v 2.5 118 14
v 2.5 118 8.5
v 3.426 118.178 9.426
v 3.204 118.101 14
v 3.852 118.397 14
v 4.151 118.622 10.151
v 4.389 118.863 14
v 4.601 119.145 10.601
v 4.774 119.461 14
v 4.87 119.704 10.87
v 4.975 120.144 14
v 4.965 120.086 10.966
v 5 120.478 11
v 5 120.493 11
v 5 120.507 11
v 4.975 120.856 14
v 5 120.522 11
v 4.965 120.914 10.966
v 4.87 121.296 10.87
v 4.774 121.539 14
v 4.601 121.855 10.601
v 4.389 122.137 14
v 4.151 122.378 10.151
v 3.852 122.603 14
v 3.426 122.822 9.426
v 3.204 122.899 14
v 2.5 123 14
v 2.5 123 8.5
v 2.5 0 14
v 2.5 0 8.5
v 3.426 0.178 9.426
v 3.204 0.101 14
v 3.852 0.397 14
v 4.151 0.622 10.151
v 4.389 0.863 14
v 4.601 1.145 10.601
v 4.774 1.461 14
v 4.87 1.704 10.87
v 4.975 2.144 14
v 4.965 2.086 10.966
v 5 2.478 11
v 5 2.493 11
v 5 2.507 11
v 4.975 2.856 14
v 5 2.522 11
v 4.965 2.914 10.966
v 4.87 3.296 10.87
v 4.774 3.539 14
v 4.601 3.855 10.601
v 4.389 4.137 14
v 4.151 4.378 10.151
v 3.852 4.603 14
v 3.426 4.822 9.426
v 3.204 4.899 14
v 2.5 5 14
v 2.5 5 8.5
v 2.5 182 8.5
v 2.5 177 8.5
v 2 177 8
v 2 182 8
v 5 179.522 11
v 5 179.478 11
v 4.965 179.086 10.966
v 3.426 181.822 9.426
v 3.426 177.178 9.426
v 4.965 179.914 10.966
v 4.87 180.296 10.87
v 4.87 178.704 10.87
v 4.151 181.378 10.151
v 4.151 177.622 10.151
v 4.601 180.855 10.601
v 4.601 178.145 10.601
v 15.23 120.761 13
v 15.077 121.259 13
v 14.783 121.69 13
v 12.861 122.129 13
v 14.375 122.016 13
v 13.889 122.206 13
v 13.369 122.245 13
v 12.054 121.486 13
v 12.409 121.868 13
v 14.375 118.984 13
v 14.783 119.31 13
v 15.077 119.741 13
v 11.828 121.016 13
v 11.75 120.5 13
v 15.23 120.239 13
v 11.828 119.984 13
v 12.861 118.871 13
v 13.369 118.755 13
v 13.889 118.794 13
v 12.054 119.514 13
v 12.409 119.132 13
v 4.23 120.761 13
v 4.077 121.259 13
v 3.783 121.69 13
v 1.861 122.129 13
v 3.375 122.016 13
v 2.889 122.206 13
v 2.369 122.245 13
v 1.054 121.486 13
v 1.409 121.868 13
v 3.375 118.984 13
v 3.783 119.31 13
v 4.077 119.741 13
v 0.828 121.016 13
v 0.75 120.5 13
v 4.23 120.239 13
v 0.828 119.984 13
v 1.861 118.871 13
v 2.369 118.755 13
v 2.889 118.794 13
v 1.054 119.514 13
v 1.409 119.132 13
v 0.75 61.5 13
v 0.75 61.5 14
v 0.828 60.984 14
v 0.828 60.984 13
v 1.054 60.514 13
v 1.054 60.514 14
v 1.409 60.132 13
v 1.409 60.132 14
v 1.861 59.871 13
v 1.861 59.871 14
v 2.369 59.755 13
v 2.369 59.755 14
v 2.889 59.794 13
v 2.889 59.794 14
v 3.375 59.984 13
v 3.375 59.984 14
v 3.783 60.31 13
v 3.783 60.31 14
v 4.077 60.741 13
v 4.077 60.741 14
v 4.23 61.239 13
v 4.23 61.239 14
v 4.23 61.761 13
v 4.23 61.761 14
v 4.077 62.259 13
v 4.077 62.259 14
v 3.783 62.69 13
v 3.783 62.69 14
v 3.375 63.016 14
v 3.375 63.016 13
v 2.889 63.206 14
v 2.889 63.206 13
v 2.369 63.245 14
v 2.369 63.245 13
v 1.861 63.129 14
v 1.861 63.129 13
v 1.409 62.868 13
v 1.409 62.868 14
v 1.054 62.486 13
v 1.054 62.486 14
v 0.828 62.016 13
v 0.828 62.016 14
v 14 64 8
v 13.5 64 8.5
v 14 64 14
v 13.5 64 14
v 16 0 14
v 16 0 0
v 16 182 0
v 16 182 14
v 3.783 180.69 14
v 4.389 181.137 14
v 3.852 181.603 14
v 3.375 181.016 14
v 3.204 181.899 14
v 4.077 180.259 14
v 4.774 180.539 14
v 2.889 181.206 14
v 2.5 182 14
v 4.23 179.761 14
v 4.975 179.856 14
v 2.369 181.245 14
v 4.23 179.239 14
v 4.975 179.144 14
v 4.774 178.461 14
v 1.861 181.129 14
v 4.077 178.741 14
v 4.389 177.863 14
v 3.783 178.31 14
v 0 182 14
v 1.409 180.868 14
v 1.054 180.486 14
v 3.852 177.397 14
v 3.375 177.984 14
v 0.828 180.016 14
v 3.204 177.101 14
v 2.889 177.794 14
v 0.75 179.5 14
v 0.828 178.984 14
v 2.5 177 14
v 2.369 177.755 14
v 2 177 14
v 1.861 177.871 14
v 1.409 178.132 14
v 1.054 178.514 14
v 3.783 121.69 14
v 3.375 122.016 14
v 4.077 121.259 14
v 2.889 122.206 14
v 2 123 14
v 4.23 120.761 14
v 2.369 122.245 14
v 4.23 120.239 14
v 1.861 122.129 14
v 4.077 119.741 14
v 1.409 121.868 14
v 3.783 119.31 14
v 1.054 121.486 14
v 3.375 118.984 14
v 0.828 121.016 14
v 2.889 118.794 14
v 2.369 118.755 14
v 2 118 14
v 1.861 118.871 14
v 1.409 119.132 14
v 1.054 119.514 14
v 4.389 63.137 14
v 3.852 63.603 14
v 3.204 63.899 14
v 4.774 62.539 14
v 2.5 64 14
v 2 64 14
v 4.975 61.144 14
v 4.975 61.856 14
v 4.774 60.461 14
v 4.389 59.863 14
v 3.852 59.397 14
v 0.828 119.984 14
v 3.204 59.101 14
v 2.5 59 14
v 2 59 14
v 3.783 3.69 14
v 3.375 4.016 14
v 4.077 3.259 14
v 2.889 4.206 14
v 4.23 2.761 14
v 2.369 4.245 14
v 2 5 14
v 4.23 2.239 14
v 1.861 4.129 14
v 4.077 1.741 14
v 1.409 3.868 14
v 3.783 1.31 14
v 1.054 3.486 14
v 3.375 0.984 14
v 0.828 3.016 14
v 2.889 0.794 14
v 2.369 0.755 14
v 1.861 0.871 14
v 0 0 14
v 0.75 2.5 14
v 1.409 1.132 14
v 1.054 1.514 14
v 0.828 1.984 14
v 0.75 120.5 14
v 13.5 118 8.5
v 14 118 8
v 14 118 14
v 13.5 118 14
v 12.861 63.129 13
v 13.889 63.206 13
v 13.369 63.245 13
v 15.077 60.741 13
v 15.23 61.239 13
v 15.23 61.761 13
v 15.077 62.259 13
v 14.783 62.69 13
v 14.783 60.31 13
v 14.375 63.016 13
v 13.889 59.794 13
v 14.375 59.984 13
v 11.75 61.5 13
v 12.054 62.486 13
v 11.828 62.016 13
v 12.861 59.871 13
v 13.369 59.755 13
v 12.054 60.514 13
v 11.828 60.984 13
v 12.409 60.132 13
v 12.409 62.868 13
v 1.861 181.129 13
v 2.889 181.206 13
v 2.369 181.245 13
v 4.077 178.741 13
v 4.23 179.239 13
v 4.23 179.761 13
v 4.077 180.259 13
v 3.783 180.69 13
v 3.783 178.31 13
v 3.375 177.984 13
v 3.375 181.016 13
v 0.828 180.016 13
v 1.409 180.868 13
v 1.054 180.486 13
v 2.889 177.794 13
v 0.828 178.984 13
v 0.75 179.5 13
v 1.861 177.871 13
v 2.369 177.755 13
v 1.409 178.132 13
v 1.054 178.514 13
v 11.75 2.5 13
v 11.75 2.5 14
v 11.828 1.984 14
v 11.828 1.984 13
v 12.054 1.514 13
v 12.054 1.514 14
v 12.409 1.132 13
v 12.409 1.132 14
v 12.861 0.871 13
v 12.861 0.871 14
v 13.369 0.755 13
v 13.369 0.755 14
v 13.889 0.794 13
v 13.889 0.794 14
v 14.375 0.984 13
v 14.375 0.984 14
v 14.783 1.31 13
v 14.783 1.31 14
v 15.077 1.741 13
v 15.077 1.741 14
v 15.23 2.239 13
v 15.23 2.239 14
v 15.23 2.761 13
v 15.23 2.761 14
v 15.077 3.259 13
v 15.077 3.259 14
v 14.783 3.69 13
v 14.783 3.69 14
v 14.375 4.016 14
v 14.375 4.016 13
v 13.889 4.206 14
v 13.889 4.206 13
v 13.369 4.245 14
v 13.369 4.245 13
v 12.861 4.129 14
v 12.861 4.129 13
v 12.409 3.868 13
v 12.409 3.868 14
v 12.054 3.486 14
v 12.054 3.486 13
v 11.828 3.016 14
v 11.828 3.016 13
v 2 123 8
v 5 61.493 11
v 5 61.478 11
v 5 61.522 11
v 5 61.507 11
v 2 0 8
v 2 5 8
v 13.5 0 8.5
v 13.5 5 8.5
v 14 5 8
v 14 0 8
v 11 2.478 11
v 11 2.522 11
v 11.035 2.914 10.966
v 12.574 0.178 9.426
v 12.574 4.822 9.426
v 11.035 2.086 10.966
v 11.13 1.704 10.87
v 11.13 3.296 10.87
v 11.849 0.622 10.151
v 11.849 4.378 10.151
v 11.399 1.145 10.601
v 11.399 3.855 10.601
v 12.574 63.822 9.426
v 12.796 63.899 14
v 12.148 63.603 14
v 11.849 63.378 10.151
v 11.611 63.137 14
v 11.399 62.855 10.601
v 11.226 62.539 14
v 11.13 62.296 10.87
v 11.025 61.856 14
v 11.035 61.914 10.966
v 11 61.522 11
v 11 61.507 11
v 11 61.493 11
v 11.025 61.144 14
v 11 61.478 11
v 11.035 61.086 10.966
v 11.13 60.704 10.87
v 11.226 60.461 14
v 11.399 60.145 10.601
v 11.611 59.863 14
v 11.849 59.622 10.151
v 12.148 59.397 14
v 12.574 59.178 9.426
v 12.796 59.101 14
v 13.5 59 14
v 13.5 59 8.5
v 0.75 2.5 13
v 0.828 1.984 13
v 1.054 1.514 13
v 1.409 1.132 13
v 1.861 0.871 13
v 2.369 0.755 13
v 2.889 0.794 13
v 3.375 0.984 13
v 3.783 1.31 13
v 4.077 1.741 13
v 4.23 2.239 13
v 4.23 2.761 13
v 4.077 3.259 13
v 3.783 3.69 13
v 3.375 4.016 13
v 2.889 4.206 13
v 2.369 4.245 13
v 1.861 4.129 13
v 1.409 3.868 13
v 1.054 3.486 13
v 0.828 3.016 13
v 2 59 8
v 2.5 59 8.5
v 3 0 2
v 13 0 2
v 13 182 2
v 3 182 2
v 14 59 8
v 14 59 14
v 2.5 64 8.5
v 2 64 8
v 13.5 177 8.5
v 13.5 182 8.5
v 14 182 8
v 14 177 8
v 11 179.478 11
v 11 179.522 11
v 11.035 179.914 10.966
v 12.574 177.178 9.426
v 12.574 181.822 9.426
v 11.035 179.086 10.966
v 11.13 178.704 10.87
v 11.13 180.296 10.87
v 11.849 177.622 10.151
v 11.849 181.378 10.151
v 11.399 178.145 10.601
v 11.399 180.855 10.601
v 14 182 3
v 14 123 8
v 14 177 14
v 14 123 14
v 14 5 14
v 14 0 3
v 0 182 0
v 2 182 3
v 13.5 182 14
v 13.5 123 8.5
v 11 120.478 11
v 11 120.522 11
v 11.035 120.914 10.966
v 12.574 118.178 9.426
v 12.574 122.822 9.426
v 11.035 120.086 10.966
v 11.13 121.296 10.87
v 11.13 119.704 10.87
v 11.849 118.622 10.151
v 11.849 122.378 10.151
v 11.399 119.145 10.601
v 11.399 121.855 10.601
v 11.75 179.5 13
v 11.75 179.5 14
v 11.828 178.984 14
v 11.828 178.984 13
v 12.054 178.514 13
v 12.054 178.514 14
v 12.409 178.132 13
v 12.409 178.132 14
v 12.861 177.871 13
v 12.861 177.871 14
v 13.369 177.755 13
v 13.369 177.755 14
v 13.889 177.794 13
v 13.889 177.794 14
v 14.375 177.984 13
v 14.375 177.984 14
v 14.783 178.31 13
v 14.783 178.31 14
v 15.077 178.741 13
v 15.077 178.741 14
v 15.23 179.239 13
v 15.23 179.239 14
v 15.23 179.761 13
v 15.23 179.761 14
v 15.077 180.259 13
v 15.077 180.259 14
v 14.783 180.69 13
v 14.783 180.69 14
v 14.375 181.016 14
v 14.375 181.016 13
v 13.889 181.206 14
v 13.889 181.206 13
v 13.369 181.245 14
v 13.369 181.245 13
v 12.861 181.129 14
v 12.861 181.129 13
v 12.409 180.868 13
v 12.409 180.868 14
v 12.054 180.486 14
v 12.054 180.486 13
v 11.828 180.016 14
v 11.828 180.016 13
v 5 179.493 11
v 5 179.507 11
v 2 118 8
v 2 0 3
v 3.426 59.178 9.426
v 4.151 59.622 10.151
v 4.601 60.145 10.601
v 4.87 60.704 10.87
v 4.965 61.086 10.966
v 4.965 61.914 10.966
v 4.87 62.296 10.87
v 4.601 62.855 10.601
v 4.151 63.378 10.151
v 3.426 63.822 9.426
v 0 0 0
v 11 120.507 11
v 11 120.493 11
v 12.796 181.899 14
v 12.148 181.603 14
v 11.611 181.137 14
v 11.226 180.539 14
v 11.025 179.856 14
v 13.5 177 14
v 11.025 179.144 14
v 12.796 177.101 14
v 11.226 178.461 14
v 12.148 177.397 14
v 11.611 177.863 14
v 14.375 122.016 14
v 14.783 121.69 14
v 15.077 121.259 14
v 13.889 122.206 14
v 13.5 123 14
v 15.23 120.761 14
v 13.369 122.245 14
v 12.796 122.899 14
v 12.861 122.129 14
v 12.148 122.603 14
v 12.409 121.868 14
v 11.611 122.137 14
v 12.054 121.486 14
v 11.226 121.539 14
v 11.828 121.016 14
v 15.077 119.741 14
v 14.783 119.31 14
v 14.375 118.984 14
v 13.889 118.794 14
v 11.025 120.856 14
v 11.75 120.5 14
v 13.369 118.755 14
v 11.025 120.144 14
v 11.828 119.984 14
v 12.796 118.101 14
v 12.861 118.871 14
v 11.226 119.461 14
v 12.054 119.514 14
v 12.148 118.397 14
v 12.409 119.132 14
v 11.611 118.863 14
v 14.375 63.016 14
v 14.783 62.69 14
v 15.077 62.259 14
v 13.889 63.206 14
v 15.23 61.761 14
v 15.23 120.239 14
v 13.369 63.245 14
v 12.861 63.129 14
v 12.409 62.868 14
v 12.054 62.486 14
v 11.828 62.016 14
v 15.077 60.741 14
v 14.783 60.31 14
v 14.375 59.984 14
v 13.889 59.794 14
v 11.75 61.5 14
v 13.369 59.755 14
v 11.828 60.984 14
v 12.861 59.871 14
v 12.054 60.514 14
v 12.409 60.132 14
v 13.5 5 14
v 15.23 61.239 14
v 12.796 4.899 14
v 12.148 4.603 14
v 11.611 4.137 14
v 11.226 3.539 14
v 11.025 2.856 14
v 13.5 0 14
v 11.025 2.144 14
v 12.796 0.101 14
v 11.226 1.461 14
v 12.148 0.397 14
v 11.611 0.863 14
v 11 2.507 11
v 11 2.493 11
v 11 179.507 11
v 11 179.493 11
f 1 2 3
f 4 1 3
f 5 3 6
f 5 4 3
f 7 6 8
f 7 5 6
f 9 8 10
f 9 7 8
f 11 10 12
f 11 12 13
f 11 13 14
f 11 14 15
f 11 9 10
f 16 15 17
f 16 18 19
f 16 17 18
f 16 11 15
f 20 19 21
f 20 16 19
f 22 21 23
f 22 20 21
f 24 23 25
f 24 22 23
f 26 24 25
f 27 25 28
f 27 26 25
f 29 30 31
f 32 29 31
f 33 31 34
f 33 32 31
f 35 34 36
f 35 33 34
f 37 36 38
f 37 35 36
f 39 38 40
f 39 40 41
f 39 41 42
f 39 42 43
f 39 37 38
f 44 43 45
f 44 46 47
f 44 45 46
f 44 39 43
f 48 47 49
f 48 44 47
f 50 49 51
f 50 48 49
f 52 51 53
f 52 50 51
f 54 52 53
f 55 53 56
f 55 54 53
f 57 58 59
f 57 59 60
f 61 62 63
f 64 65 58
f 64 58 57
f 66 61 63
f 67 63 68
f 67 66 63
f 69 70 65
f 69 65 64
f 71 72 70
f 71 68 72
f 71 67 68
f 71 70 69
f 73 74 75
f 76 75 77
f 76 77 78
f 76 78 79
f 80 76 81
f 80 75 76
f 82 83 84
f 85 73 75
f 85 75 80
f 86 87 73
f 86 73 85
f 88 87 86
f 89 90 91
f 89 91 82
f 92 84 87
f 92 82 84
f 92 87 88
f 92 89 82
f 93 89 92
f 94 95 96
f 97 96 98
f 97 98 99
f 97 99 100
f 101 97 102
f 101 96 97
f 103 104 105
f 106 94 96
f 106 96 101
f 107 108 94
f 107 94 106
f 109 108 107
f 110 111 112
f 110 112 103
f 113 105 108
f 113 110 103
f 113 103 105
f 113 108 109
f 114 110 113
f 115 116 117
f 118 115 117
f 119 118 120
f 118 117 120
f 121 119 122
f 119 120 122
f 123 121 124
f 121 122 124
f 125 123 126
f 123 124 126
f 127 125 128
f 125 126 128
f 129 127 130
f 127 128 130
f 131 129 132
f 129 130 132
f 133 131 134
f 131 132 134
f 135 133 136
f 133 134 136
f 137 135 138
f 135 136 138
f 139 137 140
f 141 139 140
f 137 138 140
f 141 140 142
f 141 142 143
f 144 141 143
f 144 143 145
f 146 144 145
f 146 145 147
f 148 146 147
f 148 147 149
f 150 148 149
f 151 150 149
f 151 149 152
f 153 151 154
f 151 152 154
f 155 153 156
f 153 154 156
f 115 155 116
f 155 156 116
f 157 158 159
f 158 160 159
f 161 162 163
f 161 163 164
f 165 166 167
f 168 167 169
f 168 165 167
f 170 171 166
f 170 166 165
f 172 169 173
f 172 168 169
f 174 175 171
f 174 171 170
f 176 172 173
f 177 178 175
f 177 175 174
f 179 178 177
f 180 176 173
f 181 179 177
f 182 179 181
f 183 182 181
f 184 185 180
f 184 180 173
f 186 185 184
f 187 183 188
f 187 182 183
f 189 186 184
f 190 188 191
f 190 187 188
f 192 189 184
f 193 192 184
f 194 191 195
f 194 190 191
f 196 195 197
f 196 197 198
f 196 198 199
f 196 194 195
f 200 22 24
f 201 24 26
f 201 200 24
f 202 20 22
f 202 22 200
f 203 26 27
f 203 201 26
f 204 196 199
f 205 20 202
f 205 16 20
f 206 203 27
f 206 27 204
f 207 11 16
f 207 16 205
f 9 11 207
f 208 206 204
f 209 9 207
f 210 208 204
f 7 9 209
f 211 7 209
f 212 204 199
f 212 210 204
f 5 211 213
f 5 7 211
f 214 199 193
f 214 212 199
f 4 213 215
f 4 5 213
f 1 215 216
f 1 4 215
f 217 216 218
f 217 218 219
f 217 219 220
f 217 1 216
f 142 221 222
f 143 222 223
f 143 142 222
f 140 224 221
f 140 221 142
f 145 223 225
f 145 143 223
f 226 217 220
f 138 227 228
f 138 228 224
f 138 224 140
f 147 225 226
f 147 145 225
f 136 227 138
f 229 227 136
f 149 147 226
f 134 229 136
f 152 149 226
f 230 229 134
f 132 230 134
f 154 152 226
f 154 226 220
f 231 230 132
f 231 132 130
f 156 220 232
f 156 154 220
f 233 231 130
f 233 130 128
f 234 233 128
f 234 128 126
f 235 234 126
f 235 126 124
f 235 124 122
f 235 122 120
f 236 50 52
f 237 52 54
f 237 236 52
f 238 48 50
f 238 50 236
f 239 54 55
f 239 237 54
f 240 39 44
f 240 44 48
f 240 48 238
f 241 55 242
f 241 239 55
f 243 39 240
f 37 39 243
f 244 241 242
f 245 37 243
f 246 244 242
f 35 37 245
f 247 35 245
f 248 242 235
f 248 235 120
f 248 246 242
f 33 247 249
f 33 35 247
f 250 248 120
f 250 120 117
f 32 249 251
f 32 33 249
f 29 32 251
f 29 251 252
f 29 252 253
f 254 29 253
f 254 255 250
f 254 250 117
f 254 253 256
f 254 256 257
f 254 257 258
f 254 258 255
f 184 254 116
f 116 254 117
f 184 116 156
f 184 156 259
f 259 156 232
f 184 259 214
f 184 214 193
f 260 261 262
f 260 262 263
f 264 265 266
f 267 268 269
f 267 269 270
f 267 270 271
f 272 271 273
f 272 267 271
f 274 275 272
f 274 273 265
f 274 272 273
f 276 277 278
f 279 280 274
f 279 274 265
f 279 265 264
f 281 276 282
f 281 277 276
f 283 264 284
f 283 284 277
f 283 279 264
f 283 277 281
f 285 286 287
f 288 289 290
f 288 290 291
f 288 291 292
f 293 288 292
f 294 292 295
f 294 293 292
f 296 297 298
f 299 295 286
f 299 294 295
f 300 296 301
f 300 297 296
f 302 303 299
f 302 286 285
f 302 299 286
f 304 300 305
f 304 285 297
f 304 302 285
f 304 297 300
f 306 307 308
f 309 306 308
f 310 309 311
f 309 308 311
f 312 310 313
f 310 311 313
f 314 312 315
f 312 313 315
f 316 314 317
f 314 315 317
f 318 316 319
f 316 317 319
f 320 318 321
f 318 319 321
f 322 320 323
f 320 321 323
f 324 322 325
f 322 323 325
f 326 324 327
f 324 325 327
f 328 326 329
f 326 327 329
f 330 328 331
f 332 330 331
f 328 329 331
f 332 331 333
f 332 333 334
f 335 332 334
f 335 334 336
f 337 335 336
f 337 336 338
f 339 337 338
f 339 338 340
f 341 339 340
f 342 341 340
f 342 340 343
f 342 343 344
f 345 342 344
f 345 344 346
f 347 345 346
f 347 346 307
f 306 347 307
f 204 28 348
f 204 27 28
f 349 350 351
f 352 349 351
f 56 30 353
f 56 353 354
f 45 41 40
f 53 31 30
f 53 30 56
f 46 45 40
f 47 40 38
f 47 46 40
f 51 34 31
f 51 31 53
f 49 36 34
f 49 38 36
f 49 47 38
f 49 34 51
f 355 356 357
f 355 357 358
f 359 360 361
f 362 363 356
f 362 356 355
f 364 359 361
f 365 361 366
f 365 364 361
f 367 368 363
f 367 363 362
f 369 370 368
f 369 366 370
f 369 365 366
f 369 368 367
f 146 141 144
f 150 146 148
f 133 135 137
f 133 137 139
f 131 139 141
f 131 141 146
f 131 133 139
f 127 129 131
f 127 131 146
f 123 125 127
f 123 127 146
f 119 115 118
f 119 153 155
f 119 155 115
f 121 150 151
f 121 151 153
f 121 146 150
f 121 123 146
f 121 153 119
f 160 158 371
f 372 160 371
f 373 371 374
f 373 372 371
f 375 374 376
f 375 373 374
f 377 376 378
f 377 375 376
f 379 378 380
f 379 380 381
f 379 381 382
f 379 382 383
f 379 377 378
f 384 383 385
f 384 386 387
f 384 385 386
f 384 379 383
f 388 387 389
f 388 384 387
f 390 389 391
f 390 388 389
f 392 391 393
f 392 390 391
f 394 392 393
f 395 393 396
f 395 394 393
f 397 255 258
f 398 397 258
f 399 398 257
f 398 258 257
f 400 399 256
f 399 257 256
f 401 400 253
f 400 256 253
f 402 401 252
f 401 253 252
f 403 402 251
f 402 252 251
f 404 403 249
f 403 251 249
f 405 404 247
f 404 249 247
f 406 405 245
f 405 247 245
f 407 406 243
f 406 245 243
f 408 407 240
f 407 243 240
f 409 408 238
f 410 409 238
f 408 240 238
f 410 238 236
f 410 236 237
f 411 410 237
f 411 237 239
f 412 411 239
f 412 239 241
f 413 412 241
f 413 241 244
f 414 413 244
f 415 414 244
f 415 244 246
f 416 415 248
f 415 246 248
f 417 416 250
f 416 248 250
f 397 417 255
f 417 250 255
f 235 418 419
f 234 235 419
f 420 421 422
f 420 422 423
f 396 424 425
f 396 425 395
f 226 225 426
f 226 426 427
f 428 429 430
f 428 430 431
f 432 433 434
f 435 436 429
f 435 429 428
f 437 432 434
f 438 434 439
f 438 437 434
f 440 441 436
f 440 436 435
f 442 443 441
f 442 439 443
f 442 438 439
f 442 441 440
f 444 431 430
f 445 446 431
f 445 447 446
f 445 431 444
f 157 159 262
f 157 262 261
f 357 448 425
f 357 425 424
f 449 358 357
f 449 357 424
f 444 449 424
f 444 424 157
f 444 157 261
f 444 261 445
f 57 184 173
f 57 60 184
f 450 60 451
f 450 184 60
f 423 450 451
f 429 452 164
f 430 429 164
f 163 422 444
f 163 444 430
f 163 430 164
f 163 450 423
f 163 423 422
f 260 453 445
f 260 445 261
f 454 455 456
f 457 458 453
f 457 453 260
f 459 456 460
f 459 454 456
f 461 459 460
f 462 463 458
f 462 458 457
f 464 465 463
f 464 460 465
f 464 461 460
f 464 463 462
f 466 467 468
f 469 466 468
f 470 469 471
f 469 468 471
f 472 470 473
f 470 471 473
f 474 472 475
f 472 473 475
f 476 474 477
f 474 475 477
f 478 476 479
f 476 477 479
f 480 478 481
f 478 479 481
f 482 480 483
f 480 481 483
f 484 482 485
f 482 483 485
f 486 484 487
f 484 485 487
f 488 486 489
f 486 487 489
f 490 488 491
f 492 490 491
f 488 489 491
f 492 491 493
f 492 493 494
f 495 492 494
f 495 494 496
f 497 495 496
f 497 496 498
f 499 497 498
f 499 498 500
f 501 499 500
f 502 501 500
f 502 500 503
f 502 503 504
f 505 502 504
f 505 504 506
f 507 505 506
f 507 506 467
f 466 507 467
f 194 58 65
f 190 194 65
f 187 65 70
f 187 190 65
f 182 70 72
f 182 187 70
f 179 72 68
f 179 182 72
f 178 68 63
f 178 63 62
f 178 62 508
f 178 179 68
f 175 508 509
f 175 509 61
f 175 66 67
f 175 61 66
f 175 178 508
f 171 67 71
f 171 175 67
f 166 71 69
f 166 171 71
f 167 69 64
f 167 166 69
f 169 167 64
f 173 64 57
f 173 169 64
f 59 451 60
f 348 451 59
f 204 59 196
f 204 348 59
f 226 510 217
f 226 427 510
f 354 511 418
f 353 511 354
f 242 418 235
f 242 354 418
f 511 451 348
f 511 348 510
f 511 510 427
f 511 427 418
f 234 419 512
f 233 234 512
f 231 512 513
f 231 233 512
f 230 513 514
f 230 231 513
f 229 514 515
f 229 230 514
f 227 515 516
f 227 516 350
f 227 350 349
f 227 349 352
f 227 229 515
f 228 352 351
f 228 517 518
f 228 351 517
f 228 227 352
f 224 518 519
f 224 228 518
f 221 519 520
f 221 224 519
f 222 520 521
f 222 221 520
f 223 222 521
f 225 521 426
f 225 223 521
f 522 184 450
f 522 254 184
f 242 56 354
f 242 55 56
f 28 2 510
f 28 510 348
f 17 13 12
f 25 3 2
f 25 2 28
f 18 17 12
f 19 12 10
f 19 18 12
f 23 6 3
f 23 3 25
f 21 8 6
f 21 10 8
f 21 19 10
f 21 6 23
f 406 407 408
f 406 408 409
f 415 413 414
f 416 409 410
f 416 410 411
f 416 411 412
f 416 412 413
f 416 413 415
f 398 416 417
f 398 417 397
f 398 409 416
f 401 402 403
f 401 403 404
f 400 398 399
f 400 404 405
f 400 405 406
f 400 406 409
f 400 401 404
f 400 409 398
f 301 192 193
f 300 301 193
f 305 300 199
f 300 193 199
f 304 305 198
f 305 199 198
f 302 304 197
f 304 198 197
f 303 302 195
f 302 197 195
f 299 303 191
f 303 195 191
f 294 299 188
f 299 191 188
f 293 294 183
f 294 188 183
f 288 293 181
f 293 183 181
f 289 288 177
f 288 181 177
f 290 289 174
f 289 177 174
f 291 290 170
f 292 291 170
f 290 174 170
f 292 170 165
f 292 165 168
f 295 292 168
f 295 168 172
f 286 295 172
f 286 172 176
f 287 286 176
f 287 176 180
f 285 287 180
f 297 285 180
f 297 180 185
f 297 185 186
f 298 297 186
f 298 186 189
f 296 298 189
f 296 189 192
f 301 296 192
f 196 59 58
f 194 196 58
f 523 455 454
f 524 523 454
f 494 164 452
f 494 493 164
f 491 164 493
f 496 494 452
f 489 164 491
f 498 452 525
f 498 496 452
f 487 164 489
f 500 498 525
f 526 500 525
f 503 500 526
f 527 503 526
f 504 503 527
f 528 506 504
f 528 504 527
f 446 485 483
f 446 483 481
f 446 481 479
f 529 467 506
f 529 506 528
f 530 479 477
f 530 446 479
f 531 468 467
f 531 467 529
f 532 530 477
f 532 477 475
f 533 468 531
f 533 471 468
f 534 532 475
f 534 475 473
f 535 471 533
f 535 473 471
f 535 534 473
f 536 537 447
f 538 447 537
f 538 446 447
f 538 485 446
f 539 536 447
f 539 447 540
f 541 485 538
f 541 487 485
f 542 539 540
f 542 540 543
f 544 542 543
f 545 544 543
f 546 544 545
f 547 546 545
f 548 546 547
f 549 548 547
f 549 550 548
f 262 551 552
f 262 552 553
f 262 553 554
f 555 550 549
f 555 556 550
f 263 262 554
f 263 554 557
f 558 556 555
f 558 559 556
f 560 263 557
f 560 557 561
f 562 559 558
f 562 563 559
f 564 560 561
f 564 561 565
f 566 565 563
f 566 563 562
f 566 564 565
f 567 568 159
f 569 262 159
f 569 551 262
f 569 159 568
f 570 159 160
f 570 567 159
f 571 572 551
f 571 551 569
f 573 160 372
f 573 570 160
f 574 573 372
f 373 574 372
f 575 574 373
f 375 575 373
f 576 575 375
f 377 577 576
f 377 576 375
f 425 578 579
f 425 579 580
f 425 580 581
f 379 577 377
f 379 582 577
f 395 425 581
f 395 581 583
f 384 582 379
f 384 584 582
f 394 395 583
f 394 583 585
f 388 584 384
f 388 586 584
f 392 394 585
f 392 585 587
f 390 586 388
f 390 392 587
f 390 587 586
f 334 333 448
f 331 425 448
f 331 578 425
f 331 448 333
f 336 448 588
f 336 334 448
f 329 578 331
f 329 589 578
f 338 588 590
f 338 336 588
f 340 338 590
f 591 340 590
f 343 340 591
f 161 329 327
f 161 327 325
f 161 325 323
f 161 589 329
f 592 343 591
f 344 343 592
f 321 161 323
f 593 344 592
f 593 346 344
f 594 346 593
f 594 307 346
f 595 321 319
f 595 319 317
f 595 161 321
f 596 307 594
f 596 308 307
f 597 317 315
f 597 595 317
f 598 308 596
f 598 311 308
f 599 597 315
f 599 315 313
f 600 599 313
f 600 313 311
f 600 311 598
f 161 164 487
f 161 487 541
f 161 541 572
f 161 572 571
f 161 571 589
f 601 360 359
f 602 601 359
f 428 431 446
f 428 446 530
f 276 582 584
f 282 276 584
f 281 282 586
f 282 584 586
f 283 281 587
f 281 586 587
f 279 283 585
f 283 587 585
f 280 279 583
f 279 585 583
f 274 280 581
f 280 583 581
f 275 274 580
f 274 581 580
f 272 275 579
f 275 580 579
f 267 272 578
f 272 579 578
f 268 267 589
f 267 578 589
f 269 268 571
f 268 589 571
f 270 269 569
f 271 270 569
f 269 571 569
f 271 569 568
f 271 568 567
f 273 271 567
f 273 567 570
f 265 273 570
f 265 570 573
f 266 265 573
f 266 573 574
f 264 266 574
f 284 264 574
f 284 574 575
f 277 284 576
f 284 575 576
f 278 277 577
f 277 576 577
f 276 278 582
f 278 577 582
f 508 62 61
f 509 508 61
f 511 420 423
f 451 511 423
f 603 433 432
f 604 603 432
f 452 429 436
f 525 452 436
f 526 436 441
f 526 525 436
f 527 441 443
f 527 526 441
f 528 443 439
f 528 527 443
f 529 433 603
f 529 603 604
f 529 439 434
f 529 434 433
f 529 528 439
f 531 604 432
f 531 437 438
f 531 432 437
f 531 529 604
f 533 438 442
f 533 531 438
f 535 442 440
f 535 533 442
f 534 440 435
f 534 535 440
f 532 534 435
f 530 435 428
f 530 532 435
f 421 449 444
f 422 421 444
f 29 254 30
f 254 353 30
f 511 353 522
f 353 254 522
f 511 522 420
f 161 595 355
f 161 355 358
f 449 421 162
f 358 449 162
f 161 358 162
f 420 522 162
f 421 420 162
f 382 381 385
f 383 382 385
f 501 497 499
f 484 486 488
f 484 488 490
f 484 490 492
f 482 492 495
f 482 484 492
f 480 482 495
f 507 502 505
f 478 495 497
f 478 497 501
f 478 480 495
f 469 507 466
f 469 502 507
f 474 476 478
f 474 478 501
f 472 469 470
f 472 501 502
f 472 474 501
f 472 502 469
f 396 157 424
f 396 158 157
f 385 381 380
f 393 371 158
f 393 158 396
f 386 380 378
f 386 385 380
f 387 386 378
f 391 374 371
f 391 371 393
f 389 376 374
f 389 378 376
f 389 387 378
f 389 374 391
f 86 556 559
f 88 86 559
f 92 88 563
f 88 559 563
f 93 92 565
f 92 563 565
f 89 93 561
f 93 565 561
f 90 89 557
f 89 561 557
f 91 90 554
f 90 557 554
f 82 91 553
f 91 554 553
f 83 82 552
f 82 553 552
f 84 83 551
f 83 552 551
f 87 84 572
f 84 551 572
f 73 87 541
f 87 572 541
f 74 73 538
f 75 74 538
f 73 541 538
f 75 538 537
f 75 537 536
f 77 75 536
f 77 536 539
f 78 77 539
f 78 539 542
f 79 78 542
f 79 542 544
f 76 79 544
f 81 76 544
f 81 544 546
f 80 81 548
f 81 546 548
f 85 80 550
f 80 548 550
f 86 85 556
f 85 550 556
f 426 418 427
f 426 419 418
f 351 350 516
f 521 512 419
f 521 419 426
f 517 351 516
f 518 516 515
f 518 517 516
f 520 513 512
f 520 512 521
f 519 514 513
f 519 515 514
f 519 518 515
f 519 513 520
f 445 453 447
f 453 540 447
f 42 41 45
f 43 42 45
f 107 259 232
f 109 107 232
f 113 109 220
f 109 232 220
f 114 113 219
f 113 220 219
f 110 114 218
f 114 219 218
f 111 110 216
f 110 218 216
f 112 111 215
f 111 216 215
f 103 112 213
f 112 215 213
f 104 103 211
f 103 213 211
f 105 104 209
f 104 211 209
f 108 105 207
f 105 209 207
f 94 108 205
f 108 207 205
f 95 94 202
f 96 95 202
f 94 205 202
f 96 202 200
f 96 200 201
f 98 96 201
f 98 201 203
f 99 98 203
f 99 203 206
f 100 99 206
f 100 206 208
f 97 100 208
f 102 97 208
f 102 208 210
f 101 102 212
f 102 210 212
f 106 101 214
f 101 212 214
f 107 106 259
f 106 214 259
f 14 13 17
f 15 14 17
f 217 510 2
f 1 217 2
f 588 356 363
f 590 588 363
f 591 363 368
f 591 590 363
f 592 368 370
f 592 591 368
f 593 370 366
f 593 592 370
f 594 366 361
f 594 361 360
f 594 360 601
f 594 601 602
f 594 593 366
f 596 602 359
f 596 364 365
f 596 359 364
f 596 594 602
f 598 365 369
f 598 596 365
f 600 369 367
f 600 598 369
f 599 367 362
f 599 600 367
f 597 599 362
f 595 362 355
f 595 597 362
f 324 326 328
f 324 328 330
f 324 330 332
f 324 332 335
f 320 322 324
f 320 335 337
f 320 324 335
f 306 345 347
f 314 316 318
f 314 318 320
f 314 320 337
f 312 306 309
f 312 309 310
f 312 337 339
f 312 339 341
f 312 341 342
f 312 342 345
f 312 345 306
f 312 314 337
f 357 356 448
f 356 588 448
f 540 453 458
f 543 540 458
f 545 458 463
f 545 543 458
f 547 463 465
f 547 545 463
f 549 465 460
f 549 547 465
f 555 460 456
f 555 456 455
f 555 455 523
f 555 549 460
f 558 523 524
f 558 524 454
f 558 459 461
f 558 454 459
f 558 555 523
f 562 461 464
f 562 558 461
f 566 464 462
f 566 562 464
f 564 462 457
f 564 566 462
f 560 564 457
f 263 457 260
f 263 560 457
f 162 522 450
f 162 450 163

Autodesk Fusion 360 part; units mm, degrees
sketch "3D-printed conduit outline" plane through (0, 0, 0) normal (0, 1, 0) x (1, 0, 0)
  line L0 (0, 0) -> (16, 0)
  line L1 (16, 0) -> (16, -14)
  line L2 (16, -14) -> (0, -14)
  line L3 (0, -14) -> (0, 0)
  line L4 (2, -14) -> (14, -14)
  line L5 (14, -14) -> (14, -2)
  line L6 (14, -2) -> (2, -2)
  line L7 (2, -2) -> (2, -14)
  dimension "d8" = 14
  dimension "d9" = 16
  dimension "d10" = 2
  dimension "d11" = 2
  dimension "d12" = 2
extrude "Extrude1" add sketch "3D-printed conduit outline" along normal blind 182 contours L0 L1 L2 L3 L5 L6 L7
sketch "Magnet holders" plane through (0, 0, 14) normal (0, 0, 1) x (-1, 0, 0)
  line L0 (0, 0) -> (-2, 0)
  line L1 (-2, 0) -> (-2, -182)
  line L2 (-2, -182) -> (0, -182)
  line L3 (0, -182) -> (0, 0)
  line L4 (-14, 0) -> (-16, 0)
  line L5 (-16, 0) -> (-16, -182)
  line L6 (-16, -182) -> (-14, -182)
  line L7 (-14, -182) -> (-14, 0)
  circle A0 centre (-2.5, -2.5) radius 2.5
  circle A1 centre (-2.5, -2.5) radius 1.75
  line L8 (-14, 0) -> (-2, 0)
  line L9 (0, 0) -> (-2.5, 0)
  line L10 (-2.5, 0) -> (-2.5, -5)
  line L11 (-2.5, -5) -> (0, -5)
  line L12 (0, -5) -> (0, 0)
  circle A2 centre (-13.5, -2.5) radius 2.5
  circle A3 centre (-13.5, -2.5) radius 1.75
  line L13 (-16, 0) -> (-13.5, 0)
  line L14 (-13.5, 0) -> (-13.5, -5)
  line L15 (-13.5, -5) -> (-16, -5)
  line L16 (-16, -5) -> (-16, 0)
  circle A4 centre (-2.5, -61.5) radius 1.75
  circle A5 centre (-2.5, -61.5) radius 2.5
  line L17 (-2.5, -59) -> (-2.5, -64)
  line L18 (-2.5, -64) -> (0, -64)
  line L19 (0, -64) -> (0, -59)
  line L20 (0, -59) -> (-2.5, -59)
  circle A6 centre (-13.5, -61.5) radius 1.75
  circle A7 centre (-13.5, -61.5) radius 2.5
  line L21 (-13.5, -59) -> (-13.5, -64)
  line L22 (-13.5, -64) -> (-16, -64)
  line L23 (-16, -64) -> (-16, -59)
  line L24 (-16, -59) -> (-13.5, -59)
  circle A8 centre (-2.5, -120.5) radius 1.75
  circle A9 centre (-2.5, -120.5) radius 2.5
  line L25 (-2.5, -118) -> (-2.5, -123)
  line L26 (-2.5, -123) -> (0, -123)
  line L27 (0, -123) -> (0, -118)
  line L28 (0, -118) -> (-2.5, -118)
  circle A10 centre (-13.5, -120.5) radius 1.75
  circle A11 centre (-13.5, -120.5) radius 2.5
  line L29 (-13.5, -118) -> (-13.5, -123)
  line L30 (-13.5, -123) -> (-16, -123)
  line L31 (-16, -123) -> (-16, -118)
  line L32 (-16, -118) -> (-13.5, -118)
  circle A12 centre (-2.5, -179.5) radius 1.75
  circle A13 centre (-2.5, -179.5) radius 2.5
  line L33 (-2.5, -177) -> (-2.5, -182)
  line L34 (-2.5, -182) -> (0, -182)
  line L35 (0, -182) -> (0, -177)
  line L36 (0, -177) -> (-2.5, -177)
  circle A14 centre (-13.5, -179.5) radius 1.75
  circle A15 centre (-13.5, -179.5) radius 2.5
  line L37 (-13.5, -177) -> (-13.5, -182)
  line L38 (-13.5, -182) -> (-16, -182)
  line L39 (-16, -182) -> (-16, -177)
  line L40 (-16, -177) -> (-13.5, -177)
  dimension "d15" = 5
  dimension "d16" = 3.5
  dimension "d17" = 5
  dimension "d18" = 3.5
  dimension "d21" = 0
  dimension "d22" = -177
extrude "Extrude2" add sketch "Magnet holders" against normal blind 3 contours A2 A3 L14 | L7 A2 A3 L14 | L7 L8 A2 L13 | L1 A0 L8 L9 | L1 A0 A1 L10 | A0 A1 L10 | L1 A0 A1 L10 | L1 A0 L11 | L1 A1 L10 | A1 L10 | L7 A3 L14 | A3 L14 | L1 A5 L20 | L7 A2 L15 | L7 A2 A3 L14 | L1 A4 A5 L17 | L1 A4 A5 L17 | L1 A5 L18 | A4 A5 L17 | L1 A4 L17 | A4 L17 | L7 A7 L24 | L1 A9 L28 | L7 A6 A7 L21 | A6 A7 L21 | L1 A8 A9 L25 | L1 A8 A9 L25 | L1 A9 L26 | A8 A9 L25 | L7 A6 L21 | A6 L21 | L7 A7 L22 | L7 A6 A7 L21 | L1 A8 L25 | A8 L25 | L1 A13 L36 | L7 A11 L32 | L1 A12 A13 L33 | L1 A12 A13 L33 | L1 A13 L34 | A12 A13 L33 | L7 A10 A11 L29 | L7 A11 L30 | L7 A10 A11 L29 | A10 A11 L29 | L1 A12 L33 | A12 L33 | L7 A10 L29 | A10 L29 | L7 A15 L40 | L7 A14 A15 L37 | L7 A15 L38 | L7 A14 A15 L37 | A14 A15 L37 | L7 A14 L37 | A14 L37
extrude "Extrude3" cut sketch "Magnet holders" against normal blind 1 contours L1 A1 | L1 A1 L10 | A1 L10 | L7 A3 L14 | A3 L14 | L7 A3 | L1 A4 | L1 A4 L17 | A4 L17 | L7 A6 L21 | L7 A6 | A6 L21 | L1 A8 | L1 A8 L25 | A8 L25 | L1 A12 | L1 A12 L33 | A12 L33 | L7 A10 L29 | L7 A10 | A10 L29 | L7 A14 L37 | L7 A14 | A14 L37
chamfer "Chamfer1" distance 1 angle 45 2 edges at (2, 91, 2) (14, 91, 2)
chamfer "Chamfer2" distance 2.9999 angle 45 8 edges at (2, 2.5, 11) (2, 61.5, 11) (2, 120.5, 11) (2, 179.5, 11) (14, 2.5, 11) (14, 61.5, 11) (14, 120.5, 11) (14, 179.5, 11)
equation "conduit_length = 182.00 mm"
equation "conduit_width = 16 mm"
equation "conduit_height = 16 mm"
equation "conduit_wall_thickness = 2 mm"
equation "magnet_diameter = 3 mm"
equation "magnet_height = 1 mm"
equation "d8 = conduit_height - conduit_wall_thickness"
equation "d9 = conduit_width"
equation "d10 = conduit_wall_thickness"
equation "d11 = conduit_wall_thickness"
equation "d12 = conduit_wall_thickness"
equation "d13 = conduit_length"
equation "d15 = magnet_diameter + 2 mm"
equation "d16 = magnet_diameter + 0.5 mm"
equation "d17 = magnet_diameter + 2 mm"
equation "d18 = magnet_diameter + 0.5 mm"
equation "d22 = -conduit_length + ( magnet_diameter + 2 mm )"
equation "d23 = -( magnet_height + 2 mm )"
